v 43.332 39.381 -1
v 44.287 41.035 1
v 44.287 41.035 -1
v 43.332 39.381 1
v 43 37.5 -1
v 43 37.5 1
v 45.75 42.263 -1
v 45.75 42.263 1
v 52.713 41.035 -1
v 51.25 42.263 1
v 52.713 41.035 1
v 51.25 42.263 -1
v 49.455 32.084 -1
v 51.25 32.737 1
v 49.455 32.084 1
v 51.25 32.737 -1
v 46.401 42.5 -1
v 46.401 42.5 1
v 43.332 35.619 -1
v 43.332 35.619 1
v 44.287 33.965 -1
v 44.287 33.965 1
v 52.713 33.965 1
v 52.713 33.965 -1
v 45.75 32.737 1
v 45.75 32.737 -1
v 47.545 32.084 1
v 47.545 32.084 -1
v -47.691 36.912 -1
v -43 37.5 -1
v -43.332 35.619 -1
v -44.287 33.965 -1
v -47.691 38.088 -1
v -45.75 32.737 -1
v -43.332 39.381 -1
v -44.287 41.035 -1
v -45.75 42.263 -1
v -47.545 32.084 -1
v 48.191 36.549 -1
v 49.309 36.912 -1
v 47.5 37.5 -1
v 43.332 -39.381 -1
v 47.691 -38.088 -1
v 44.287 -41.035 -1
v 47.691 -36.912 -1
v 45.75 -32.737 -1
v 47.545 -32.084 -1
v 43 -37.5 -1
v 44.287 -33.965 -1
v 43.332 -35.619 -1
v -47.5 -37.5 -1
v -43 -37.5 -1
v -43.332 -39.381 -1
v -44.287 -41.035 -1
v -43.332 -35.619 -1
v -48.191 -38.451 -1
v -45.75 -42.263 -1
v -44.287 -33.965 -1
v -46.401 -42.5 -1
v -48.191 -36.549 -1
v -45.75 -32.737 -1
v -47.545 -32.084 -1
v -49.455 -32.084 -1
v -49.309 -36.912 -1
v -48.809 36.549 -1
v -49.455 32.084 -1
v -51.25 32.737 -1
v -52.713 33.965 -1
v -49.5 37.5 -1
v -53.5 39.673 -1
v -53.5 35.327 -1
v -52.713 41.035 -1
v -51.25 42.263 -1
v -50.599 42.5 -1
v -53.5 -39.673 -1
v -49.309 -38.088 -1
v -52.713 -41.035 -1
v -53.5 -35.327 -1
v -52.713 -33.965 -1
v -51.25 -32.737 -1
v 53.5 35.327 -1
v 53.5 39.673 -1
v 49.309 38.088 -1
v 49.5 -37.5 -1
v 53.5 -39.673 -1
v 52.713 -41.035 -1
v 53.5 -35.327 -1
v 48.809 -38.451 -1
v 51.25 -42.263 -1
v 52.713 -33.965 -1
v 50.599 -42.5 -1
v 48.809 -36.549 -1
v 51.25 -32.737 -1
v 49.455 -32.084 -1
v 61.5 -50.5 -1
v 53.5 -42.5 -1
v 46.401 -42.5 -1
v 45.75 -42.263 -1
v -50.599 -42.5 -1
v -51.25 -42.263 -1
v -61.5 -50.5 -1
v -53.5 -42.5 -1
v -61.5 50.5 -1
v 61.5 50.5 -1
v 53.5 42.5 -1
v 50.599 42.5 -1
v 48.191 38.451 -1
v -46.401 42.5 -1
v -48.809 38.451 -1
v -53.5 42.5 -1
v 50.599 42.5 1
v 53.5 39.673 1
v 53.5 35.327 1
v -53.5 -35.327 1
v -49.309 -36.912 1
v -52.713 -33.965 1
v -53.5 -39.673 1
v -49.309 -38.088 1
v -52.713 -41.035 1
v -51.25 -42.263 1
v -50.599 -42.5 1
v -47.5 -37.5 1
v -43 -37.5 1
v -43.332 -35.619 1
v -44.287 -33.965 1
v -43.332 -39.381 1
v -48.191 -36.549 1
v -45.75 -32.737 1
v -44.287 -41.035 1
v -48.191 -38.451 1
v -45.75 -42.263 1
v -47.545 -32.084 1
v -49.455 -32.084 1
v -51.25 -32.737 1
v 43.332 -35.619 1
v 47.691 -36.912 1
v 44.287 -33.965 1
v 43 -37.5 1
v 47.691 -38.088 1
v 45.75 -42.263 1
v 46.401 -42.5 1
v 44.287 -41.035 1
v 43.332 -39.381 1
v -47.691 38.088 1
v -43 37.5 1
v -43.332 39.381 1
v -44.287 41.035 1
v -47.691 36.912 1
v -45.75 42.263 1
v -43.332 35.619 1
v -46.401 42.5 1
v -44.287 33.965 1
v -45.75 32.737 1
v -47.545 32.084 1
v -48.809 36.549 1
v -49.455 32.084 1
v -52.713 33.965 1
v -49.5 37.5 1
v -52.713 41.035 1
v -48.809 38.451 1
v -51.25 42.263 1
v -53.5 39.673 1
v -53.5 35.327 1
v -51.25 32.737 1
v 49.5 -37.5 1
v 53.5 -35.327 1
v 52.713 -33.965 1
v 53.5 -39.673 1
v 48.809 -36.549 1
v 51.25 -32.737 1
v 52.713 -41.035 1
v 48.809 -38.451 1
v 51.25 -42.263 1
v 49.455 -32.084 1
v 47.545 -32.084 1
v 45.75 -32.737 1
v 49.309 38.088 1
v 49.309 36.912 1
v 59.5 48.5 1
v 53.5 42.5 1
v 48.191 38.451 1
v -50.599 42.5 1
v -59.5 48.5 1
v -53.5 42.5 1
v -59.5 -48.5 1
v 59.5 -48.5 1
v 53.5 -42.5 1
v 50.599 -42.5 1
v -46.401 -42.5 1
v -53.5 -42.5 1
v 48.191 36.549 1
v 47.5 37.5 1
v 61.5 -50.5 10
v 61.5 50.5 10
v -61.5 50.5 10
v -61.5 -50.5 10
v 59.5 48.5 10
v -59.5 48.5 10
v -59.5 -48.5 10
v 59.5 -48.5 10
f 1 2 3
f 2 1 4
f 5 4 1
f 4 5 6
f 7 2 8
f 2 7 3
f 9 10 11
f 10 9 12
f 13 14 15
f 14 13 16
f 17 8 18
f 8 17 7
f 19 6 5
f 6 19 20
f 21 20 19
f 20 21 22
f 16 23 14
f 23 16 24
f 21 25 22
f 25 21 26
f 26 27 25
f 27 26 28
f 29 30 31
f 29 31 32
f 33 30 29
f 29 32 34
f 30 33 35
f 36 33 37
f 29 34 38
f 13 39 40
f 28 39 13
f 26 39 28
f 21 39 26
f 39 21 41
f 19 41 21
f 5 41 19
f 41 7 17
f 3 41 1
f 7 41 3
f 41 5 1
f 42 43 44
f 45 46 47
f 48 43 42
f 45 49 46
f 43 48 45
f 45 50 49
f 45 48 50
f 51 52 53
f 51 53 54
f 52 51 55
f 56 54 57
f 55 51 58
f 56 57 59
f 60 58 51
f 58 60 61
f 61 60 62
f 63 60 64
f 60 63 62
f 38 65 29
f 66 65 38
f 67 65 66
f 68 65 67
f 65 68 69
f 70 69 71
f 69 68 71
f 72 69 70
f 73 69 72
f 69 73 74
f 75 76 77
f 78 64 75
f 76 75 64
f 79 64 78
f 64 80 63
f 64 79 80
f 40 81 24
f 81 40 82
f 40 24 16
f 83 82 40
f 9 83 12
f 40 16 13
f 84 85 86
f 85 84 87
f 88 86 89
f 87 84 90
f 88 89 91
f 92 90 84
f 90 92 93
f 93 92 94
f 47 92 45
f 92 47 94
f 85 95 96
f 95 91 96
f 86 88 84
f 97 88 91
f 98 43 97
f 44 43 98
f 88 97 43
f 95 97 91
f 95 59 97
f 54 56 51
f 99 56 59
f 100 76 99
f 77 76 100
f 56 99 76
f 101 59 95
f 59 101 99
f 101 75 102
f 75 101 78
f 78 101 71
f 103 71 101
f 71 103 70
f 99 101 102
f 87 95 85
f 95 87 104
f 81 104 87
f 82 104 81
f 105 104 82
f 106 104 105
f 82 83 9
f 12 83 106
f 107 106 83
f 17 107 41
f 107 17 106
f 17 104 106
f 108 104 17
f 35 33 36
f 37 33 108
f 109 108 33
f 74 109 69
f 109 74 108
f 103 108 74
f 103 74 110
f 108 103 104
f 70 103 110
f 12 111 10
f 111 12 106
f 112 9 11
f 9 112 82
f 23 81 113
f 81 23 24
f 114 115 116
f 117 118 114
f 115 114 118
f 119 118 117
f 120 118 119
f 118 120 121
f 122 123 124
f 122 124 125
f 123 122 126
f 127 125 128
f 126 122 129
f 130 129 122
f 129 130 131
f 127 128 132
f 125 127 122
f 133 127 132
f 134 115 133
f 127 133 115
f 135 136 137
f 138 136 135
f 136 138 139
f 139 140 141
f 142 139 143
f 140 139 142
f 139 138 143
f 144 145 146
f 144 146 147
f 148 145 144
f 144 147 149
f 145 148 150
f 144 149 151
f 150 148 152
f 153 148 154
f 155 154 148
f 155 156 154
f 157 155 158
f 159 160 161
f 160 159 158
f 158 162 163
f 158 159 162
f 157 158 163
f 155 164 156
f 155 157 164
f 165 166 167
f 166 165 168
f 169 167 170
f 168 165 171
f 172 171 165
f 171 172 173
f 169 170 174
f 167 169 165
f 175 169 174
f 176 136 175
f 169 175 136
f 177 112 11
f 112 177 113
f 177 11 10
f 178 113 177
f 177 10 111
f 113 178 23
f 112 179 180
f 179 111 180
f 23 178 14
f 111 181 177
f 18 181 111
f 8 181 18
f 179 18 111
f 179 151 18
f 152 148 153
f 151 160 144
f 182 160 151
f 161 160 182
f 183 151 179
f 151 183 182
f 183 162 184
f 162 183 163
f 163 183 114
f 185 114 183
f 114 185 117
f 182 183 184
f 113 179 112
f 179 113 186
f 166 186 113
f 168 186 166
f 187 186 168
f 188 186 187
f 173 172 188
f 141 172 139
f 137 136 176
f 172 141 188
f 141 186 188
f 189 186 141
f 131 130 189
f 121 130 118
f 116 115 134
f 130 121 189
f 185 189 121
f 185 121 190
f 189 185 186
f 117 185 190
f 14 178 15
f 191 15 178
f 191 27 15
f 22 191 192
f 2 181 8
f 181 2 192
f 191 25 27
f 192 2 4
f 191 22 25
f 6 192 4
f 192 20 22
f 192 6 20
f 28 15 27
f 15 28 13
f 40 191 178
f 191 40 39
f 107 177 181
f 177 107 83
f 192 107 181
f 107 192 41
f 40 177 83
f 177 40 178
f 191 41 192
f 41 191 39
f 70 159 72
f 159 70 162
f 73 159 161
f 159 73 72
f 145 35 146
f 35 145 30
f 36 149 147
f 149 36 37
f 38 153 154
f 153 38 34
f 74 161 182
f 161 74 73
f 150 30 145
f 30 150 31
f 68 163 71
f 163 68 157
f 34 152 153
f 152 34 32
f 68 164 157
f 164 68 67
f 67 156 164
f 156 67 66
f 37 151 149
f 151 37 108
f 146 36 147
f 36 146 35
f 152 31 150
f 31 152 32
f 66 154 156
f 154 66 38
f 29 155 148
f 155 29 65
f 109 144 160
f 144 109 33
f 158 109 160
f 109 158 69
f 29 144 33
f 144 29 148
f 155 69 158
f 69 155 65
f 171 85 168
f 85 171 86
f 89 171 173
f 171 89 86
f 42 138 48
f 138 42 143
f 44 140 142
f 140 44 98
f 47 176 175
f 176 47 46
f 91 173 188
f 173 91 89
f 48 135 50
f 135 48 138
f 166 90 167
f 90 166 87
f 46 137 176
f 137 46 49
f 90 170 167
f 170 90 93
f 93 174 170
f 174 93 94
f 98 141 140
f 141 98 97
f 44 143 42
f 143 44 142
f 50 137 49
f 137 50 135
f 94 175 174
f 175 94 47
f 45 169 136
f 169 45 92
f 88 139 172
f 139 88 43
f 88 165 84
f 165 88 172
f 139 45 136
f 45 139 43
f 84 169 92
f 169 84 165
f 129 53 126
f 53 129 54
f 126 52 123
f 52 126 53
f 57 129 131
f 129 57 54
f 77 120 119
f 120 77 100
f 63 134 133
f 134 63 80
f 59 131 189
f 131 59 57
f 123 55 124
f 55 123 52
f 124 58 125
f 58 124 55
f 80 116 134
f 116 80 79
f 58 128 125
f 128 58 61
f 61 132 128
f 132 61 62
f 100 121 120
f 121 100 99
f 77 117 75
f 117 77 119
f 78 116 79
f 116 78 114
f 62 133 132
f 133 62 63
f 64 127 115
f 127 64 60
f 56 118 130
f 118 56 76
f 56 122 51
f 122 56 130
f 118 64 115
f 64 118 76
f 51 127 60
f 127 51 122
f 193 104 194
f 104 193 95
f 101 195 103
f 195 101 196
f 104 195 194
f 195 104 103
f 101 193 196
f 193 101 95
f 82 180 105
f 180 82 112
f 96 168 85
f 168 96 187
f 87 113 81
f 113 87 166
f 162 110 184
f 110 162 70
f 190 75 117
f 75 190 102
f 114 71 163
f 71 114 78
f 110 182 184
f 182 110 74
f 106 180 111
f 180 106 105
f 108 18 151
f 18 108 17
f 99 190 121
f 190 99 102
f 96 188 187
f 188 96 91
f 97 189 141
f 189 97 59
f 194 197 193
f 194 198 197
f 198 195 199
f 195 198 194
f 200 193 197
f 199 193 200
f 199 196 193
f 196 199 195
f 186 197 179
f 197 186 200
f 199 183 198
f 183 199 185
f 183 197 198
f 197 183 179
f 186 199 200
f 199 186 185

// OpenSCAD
diameter_inside=107;
diameter_inside_short=85;
thickness=8;
height=2;
height_outside_part=10;
outside_part_thickness=2;
bottomSide=0;
//support triangle
striangle_l=10;
striangle_w=10;
striangle_h=2;
screwl=2;
screww=2;
triangle_position_h=(height-(striangle_h+screwl)-height/2);
triangle_difference=-striangle_w/2;
triangle_position_l=diameter_inside/2+triangle_difference;
triangle_position_w=diameter_inside_short/2+triangle_difference;

//translate([0,0,height/2]) hose();
translate([triangle_position_l,triangle_position_w,triangle_position_h]) support_triangle(striangle_l,striangle_w,striangle_h);
translate([-triangle_position_l,triangle_position_w,triangle_position_h]) support_triangle(striangle_l,striangle_w,striangle_h);
translate([triangle_position_l,-triangle_position_w,triangle_position_h]) rotate([0,0,180]) support_triangle(striangle_l,striangle_w,striangle_h);
translate([-triangle_position_l,-triangle_position_w,triangle_position_h]) rotate([0,0,180]) support_triangle(striangle_l,striangle_w,striangle_h);

box();
translate([0,0,height_outside_part/2]) box_outside();


module box() {
difference(){
//outside 
cube([diameter_inside+(thickness*2),diameter_inside_short+(thickness*2), height], center=true);
//vnitrni trubka odectena
translate([0,0,bottomSide]) cube([diameter_inside,diameter_inside_short, height], center=true);
}
}

module box_outside() {
difference(){
//outside 
cube([diameter_inside+(thickness*2),diameter_inside_short+(thickness*2), height_outside_part], center=true);
//vnitrni trubka odectena
translate([0,0,bottomSide]) cube([diameter_inside+(thickness*2)-2*outside_part_thickness,diameter_inside_short+(thickness*2)-2*outside_part_thickness, height_outside_part], center=true);
}
}    

module hose() {
difference(){
//outside cylinder
cylinder(h=height,r=(diameter_inside+thickness*2)/2,center=true,$fn=100);
//vnitrni trubka odectena
translate([0,0,bottomSide]) cylinder(h=height,r=diameter_inside/2,center=true,$fn=100);
}
}



module support_triangle(l,w,h){
translate([0,0,h]){
rotate([0,180,0]){
union(){
/*
translate([-l/2,-w/2,0]){
    polyhedron(
               points=[[0,0,0], [l,0,0], [l,w,0], [0,w,0], [0,w,h], [l,w,h]],
               faces=[[0,1,2,3],[5,4,3,2],[0,4,5,1],[0,3,4],[5,2,1]]
               );} 
               */
mirror([0,0,1]) difference() {cylinder(h=screwl,d=w+1); cylinder(h=screwl,d=screww);}
}
               }}}
